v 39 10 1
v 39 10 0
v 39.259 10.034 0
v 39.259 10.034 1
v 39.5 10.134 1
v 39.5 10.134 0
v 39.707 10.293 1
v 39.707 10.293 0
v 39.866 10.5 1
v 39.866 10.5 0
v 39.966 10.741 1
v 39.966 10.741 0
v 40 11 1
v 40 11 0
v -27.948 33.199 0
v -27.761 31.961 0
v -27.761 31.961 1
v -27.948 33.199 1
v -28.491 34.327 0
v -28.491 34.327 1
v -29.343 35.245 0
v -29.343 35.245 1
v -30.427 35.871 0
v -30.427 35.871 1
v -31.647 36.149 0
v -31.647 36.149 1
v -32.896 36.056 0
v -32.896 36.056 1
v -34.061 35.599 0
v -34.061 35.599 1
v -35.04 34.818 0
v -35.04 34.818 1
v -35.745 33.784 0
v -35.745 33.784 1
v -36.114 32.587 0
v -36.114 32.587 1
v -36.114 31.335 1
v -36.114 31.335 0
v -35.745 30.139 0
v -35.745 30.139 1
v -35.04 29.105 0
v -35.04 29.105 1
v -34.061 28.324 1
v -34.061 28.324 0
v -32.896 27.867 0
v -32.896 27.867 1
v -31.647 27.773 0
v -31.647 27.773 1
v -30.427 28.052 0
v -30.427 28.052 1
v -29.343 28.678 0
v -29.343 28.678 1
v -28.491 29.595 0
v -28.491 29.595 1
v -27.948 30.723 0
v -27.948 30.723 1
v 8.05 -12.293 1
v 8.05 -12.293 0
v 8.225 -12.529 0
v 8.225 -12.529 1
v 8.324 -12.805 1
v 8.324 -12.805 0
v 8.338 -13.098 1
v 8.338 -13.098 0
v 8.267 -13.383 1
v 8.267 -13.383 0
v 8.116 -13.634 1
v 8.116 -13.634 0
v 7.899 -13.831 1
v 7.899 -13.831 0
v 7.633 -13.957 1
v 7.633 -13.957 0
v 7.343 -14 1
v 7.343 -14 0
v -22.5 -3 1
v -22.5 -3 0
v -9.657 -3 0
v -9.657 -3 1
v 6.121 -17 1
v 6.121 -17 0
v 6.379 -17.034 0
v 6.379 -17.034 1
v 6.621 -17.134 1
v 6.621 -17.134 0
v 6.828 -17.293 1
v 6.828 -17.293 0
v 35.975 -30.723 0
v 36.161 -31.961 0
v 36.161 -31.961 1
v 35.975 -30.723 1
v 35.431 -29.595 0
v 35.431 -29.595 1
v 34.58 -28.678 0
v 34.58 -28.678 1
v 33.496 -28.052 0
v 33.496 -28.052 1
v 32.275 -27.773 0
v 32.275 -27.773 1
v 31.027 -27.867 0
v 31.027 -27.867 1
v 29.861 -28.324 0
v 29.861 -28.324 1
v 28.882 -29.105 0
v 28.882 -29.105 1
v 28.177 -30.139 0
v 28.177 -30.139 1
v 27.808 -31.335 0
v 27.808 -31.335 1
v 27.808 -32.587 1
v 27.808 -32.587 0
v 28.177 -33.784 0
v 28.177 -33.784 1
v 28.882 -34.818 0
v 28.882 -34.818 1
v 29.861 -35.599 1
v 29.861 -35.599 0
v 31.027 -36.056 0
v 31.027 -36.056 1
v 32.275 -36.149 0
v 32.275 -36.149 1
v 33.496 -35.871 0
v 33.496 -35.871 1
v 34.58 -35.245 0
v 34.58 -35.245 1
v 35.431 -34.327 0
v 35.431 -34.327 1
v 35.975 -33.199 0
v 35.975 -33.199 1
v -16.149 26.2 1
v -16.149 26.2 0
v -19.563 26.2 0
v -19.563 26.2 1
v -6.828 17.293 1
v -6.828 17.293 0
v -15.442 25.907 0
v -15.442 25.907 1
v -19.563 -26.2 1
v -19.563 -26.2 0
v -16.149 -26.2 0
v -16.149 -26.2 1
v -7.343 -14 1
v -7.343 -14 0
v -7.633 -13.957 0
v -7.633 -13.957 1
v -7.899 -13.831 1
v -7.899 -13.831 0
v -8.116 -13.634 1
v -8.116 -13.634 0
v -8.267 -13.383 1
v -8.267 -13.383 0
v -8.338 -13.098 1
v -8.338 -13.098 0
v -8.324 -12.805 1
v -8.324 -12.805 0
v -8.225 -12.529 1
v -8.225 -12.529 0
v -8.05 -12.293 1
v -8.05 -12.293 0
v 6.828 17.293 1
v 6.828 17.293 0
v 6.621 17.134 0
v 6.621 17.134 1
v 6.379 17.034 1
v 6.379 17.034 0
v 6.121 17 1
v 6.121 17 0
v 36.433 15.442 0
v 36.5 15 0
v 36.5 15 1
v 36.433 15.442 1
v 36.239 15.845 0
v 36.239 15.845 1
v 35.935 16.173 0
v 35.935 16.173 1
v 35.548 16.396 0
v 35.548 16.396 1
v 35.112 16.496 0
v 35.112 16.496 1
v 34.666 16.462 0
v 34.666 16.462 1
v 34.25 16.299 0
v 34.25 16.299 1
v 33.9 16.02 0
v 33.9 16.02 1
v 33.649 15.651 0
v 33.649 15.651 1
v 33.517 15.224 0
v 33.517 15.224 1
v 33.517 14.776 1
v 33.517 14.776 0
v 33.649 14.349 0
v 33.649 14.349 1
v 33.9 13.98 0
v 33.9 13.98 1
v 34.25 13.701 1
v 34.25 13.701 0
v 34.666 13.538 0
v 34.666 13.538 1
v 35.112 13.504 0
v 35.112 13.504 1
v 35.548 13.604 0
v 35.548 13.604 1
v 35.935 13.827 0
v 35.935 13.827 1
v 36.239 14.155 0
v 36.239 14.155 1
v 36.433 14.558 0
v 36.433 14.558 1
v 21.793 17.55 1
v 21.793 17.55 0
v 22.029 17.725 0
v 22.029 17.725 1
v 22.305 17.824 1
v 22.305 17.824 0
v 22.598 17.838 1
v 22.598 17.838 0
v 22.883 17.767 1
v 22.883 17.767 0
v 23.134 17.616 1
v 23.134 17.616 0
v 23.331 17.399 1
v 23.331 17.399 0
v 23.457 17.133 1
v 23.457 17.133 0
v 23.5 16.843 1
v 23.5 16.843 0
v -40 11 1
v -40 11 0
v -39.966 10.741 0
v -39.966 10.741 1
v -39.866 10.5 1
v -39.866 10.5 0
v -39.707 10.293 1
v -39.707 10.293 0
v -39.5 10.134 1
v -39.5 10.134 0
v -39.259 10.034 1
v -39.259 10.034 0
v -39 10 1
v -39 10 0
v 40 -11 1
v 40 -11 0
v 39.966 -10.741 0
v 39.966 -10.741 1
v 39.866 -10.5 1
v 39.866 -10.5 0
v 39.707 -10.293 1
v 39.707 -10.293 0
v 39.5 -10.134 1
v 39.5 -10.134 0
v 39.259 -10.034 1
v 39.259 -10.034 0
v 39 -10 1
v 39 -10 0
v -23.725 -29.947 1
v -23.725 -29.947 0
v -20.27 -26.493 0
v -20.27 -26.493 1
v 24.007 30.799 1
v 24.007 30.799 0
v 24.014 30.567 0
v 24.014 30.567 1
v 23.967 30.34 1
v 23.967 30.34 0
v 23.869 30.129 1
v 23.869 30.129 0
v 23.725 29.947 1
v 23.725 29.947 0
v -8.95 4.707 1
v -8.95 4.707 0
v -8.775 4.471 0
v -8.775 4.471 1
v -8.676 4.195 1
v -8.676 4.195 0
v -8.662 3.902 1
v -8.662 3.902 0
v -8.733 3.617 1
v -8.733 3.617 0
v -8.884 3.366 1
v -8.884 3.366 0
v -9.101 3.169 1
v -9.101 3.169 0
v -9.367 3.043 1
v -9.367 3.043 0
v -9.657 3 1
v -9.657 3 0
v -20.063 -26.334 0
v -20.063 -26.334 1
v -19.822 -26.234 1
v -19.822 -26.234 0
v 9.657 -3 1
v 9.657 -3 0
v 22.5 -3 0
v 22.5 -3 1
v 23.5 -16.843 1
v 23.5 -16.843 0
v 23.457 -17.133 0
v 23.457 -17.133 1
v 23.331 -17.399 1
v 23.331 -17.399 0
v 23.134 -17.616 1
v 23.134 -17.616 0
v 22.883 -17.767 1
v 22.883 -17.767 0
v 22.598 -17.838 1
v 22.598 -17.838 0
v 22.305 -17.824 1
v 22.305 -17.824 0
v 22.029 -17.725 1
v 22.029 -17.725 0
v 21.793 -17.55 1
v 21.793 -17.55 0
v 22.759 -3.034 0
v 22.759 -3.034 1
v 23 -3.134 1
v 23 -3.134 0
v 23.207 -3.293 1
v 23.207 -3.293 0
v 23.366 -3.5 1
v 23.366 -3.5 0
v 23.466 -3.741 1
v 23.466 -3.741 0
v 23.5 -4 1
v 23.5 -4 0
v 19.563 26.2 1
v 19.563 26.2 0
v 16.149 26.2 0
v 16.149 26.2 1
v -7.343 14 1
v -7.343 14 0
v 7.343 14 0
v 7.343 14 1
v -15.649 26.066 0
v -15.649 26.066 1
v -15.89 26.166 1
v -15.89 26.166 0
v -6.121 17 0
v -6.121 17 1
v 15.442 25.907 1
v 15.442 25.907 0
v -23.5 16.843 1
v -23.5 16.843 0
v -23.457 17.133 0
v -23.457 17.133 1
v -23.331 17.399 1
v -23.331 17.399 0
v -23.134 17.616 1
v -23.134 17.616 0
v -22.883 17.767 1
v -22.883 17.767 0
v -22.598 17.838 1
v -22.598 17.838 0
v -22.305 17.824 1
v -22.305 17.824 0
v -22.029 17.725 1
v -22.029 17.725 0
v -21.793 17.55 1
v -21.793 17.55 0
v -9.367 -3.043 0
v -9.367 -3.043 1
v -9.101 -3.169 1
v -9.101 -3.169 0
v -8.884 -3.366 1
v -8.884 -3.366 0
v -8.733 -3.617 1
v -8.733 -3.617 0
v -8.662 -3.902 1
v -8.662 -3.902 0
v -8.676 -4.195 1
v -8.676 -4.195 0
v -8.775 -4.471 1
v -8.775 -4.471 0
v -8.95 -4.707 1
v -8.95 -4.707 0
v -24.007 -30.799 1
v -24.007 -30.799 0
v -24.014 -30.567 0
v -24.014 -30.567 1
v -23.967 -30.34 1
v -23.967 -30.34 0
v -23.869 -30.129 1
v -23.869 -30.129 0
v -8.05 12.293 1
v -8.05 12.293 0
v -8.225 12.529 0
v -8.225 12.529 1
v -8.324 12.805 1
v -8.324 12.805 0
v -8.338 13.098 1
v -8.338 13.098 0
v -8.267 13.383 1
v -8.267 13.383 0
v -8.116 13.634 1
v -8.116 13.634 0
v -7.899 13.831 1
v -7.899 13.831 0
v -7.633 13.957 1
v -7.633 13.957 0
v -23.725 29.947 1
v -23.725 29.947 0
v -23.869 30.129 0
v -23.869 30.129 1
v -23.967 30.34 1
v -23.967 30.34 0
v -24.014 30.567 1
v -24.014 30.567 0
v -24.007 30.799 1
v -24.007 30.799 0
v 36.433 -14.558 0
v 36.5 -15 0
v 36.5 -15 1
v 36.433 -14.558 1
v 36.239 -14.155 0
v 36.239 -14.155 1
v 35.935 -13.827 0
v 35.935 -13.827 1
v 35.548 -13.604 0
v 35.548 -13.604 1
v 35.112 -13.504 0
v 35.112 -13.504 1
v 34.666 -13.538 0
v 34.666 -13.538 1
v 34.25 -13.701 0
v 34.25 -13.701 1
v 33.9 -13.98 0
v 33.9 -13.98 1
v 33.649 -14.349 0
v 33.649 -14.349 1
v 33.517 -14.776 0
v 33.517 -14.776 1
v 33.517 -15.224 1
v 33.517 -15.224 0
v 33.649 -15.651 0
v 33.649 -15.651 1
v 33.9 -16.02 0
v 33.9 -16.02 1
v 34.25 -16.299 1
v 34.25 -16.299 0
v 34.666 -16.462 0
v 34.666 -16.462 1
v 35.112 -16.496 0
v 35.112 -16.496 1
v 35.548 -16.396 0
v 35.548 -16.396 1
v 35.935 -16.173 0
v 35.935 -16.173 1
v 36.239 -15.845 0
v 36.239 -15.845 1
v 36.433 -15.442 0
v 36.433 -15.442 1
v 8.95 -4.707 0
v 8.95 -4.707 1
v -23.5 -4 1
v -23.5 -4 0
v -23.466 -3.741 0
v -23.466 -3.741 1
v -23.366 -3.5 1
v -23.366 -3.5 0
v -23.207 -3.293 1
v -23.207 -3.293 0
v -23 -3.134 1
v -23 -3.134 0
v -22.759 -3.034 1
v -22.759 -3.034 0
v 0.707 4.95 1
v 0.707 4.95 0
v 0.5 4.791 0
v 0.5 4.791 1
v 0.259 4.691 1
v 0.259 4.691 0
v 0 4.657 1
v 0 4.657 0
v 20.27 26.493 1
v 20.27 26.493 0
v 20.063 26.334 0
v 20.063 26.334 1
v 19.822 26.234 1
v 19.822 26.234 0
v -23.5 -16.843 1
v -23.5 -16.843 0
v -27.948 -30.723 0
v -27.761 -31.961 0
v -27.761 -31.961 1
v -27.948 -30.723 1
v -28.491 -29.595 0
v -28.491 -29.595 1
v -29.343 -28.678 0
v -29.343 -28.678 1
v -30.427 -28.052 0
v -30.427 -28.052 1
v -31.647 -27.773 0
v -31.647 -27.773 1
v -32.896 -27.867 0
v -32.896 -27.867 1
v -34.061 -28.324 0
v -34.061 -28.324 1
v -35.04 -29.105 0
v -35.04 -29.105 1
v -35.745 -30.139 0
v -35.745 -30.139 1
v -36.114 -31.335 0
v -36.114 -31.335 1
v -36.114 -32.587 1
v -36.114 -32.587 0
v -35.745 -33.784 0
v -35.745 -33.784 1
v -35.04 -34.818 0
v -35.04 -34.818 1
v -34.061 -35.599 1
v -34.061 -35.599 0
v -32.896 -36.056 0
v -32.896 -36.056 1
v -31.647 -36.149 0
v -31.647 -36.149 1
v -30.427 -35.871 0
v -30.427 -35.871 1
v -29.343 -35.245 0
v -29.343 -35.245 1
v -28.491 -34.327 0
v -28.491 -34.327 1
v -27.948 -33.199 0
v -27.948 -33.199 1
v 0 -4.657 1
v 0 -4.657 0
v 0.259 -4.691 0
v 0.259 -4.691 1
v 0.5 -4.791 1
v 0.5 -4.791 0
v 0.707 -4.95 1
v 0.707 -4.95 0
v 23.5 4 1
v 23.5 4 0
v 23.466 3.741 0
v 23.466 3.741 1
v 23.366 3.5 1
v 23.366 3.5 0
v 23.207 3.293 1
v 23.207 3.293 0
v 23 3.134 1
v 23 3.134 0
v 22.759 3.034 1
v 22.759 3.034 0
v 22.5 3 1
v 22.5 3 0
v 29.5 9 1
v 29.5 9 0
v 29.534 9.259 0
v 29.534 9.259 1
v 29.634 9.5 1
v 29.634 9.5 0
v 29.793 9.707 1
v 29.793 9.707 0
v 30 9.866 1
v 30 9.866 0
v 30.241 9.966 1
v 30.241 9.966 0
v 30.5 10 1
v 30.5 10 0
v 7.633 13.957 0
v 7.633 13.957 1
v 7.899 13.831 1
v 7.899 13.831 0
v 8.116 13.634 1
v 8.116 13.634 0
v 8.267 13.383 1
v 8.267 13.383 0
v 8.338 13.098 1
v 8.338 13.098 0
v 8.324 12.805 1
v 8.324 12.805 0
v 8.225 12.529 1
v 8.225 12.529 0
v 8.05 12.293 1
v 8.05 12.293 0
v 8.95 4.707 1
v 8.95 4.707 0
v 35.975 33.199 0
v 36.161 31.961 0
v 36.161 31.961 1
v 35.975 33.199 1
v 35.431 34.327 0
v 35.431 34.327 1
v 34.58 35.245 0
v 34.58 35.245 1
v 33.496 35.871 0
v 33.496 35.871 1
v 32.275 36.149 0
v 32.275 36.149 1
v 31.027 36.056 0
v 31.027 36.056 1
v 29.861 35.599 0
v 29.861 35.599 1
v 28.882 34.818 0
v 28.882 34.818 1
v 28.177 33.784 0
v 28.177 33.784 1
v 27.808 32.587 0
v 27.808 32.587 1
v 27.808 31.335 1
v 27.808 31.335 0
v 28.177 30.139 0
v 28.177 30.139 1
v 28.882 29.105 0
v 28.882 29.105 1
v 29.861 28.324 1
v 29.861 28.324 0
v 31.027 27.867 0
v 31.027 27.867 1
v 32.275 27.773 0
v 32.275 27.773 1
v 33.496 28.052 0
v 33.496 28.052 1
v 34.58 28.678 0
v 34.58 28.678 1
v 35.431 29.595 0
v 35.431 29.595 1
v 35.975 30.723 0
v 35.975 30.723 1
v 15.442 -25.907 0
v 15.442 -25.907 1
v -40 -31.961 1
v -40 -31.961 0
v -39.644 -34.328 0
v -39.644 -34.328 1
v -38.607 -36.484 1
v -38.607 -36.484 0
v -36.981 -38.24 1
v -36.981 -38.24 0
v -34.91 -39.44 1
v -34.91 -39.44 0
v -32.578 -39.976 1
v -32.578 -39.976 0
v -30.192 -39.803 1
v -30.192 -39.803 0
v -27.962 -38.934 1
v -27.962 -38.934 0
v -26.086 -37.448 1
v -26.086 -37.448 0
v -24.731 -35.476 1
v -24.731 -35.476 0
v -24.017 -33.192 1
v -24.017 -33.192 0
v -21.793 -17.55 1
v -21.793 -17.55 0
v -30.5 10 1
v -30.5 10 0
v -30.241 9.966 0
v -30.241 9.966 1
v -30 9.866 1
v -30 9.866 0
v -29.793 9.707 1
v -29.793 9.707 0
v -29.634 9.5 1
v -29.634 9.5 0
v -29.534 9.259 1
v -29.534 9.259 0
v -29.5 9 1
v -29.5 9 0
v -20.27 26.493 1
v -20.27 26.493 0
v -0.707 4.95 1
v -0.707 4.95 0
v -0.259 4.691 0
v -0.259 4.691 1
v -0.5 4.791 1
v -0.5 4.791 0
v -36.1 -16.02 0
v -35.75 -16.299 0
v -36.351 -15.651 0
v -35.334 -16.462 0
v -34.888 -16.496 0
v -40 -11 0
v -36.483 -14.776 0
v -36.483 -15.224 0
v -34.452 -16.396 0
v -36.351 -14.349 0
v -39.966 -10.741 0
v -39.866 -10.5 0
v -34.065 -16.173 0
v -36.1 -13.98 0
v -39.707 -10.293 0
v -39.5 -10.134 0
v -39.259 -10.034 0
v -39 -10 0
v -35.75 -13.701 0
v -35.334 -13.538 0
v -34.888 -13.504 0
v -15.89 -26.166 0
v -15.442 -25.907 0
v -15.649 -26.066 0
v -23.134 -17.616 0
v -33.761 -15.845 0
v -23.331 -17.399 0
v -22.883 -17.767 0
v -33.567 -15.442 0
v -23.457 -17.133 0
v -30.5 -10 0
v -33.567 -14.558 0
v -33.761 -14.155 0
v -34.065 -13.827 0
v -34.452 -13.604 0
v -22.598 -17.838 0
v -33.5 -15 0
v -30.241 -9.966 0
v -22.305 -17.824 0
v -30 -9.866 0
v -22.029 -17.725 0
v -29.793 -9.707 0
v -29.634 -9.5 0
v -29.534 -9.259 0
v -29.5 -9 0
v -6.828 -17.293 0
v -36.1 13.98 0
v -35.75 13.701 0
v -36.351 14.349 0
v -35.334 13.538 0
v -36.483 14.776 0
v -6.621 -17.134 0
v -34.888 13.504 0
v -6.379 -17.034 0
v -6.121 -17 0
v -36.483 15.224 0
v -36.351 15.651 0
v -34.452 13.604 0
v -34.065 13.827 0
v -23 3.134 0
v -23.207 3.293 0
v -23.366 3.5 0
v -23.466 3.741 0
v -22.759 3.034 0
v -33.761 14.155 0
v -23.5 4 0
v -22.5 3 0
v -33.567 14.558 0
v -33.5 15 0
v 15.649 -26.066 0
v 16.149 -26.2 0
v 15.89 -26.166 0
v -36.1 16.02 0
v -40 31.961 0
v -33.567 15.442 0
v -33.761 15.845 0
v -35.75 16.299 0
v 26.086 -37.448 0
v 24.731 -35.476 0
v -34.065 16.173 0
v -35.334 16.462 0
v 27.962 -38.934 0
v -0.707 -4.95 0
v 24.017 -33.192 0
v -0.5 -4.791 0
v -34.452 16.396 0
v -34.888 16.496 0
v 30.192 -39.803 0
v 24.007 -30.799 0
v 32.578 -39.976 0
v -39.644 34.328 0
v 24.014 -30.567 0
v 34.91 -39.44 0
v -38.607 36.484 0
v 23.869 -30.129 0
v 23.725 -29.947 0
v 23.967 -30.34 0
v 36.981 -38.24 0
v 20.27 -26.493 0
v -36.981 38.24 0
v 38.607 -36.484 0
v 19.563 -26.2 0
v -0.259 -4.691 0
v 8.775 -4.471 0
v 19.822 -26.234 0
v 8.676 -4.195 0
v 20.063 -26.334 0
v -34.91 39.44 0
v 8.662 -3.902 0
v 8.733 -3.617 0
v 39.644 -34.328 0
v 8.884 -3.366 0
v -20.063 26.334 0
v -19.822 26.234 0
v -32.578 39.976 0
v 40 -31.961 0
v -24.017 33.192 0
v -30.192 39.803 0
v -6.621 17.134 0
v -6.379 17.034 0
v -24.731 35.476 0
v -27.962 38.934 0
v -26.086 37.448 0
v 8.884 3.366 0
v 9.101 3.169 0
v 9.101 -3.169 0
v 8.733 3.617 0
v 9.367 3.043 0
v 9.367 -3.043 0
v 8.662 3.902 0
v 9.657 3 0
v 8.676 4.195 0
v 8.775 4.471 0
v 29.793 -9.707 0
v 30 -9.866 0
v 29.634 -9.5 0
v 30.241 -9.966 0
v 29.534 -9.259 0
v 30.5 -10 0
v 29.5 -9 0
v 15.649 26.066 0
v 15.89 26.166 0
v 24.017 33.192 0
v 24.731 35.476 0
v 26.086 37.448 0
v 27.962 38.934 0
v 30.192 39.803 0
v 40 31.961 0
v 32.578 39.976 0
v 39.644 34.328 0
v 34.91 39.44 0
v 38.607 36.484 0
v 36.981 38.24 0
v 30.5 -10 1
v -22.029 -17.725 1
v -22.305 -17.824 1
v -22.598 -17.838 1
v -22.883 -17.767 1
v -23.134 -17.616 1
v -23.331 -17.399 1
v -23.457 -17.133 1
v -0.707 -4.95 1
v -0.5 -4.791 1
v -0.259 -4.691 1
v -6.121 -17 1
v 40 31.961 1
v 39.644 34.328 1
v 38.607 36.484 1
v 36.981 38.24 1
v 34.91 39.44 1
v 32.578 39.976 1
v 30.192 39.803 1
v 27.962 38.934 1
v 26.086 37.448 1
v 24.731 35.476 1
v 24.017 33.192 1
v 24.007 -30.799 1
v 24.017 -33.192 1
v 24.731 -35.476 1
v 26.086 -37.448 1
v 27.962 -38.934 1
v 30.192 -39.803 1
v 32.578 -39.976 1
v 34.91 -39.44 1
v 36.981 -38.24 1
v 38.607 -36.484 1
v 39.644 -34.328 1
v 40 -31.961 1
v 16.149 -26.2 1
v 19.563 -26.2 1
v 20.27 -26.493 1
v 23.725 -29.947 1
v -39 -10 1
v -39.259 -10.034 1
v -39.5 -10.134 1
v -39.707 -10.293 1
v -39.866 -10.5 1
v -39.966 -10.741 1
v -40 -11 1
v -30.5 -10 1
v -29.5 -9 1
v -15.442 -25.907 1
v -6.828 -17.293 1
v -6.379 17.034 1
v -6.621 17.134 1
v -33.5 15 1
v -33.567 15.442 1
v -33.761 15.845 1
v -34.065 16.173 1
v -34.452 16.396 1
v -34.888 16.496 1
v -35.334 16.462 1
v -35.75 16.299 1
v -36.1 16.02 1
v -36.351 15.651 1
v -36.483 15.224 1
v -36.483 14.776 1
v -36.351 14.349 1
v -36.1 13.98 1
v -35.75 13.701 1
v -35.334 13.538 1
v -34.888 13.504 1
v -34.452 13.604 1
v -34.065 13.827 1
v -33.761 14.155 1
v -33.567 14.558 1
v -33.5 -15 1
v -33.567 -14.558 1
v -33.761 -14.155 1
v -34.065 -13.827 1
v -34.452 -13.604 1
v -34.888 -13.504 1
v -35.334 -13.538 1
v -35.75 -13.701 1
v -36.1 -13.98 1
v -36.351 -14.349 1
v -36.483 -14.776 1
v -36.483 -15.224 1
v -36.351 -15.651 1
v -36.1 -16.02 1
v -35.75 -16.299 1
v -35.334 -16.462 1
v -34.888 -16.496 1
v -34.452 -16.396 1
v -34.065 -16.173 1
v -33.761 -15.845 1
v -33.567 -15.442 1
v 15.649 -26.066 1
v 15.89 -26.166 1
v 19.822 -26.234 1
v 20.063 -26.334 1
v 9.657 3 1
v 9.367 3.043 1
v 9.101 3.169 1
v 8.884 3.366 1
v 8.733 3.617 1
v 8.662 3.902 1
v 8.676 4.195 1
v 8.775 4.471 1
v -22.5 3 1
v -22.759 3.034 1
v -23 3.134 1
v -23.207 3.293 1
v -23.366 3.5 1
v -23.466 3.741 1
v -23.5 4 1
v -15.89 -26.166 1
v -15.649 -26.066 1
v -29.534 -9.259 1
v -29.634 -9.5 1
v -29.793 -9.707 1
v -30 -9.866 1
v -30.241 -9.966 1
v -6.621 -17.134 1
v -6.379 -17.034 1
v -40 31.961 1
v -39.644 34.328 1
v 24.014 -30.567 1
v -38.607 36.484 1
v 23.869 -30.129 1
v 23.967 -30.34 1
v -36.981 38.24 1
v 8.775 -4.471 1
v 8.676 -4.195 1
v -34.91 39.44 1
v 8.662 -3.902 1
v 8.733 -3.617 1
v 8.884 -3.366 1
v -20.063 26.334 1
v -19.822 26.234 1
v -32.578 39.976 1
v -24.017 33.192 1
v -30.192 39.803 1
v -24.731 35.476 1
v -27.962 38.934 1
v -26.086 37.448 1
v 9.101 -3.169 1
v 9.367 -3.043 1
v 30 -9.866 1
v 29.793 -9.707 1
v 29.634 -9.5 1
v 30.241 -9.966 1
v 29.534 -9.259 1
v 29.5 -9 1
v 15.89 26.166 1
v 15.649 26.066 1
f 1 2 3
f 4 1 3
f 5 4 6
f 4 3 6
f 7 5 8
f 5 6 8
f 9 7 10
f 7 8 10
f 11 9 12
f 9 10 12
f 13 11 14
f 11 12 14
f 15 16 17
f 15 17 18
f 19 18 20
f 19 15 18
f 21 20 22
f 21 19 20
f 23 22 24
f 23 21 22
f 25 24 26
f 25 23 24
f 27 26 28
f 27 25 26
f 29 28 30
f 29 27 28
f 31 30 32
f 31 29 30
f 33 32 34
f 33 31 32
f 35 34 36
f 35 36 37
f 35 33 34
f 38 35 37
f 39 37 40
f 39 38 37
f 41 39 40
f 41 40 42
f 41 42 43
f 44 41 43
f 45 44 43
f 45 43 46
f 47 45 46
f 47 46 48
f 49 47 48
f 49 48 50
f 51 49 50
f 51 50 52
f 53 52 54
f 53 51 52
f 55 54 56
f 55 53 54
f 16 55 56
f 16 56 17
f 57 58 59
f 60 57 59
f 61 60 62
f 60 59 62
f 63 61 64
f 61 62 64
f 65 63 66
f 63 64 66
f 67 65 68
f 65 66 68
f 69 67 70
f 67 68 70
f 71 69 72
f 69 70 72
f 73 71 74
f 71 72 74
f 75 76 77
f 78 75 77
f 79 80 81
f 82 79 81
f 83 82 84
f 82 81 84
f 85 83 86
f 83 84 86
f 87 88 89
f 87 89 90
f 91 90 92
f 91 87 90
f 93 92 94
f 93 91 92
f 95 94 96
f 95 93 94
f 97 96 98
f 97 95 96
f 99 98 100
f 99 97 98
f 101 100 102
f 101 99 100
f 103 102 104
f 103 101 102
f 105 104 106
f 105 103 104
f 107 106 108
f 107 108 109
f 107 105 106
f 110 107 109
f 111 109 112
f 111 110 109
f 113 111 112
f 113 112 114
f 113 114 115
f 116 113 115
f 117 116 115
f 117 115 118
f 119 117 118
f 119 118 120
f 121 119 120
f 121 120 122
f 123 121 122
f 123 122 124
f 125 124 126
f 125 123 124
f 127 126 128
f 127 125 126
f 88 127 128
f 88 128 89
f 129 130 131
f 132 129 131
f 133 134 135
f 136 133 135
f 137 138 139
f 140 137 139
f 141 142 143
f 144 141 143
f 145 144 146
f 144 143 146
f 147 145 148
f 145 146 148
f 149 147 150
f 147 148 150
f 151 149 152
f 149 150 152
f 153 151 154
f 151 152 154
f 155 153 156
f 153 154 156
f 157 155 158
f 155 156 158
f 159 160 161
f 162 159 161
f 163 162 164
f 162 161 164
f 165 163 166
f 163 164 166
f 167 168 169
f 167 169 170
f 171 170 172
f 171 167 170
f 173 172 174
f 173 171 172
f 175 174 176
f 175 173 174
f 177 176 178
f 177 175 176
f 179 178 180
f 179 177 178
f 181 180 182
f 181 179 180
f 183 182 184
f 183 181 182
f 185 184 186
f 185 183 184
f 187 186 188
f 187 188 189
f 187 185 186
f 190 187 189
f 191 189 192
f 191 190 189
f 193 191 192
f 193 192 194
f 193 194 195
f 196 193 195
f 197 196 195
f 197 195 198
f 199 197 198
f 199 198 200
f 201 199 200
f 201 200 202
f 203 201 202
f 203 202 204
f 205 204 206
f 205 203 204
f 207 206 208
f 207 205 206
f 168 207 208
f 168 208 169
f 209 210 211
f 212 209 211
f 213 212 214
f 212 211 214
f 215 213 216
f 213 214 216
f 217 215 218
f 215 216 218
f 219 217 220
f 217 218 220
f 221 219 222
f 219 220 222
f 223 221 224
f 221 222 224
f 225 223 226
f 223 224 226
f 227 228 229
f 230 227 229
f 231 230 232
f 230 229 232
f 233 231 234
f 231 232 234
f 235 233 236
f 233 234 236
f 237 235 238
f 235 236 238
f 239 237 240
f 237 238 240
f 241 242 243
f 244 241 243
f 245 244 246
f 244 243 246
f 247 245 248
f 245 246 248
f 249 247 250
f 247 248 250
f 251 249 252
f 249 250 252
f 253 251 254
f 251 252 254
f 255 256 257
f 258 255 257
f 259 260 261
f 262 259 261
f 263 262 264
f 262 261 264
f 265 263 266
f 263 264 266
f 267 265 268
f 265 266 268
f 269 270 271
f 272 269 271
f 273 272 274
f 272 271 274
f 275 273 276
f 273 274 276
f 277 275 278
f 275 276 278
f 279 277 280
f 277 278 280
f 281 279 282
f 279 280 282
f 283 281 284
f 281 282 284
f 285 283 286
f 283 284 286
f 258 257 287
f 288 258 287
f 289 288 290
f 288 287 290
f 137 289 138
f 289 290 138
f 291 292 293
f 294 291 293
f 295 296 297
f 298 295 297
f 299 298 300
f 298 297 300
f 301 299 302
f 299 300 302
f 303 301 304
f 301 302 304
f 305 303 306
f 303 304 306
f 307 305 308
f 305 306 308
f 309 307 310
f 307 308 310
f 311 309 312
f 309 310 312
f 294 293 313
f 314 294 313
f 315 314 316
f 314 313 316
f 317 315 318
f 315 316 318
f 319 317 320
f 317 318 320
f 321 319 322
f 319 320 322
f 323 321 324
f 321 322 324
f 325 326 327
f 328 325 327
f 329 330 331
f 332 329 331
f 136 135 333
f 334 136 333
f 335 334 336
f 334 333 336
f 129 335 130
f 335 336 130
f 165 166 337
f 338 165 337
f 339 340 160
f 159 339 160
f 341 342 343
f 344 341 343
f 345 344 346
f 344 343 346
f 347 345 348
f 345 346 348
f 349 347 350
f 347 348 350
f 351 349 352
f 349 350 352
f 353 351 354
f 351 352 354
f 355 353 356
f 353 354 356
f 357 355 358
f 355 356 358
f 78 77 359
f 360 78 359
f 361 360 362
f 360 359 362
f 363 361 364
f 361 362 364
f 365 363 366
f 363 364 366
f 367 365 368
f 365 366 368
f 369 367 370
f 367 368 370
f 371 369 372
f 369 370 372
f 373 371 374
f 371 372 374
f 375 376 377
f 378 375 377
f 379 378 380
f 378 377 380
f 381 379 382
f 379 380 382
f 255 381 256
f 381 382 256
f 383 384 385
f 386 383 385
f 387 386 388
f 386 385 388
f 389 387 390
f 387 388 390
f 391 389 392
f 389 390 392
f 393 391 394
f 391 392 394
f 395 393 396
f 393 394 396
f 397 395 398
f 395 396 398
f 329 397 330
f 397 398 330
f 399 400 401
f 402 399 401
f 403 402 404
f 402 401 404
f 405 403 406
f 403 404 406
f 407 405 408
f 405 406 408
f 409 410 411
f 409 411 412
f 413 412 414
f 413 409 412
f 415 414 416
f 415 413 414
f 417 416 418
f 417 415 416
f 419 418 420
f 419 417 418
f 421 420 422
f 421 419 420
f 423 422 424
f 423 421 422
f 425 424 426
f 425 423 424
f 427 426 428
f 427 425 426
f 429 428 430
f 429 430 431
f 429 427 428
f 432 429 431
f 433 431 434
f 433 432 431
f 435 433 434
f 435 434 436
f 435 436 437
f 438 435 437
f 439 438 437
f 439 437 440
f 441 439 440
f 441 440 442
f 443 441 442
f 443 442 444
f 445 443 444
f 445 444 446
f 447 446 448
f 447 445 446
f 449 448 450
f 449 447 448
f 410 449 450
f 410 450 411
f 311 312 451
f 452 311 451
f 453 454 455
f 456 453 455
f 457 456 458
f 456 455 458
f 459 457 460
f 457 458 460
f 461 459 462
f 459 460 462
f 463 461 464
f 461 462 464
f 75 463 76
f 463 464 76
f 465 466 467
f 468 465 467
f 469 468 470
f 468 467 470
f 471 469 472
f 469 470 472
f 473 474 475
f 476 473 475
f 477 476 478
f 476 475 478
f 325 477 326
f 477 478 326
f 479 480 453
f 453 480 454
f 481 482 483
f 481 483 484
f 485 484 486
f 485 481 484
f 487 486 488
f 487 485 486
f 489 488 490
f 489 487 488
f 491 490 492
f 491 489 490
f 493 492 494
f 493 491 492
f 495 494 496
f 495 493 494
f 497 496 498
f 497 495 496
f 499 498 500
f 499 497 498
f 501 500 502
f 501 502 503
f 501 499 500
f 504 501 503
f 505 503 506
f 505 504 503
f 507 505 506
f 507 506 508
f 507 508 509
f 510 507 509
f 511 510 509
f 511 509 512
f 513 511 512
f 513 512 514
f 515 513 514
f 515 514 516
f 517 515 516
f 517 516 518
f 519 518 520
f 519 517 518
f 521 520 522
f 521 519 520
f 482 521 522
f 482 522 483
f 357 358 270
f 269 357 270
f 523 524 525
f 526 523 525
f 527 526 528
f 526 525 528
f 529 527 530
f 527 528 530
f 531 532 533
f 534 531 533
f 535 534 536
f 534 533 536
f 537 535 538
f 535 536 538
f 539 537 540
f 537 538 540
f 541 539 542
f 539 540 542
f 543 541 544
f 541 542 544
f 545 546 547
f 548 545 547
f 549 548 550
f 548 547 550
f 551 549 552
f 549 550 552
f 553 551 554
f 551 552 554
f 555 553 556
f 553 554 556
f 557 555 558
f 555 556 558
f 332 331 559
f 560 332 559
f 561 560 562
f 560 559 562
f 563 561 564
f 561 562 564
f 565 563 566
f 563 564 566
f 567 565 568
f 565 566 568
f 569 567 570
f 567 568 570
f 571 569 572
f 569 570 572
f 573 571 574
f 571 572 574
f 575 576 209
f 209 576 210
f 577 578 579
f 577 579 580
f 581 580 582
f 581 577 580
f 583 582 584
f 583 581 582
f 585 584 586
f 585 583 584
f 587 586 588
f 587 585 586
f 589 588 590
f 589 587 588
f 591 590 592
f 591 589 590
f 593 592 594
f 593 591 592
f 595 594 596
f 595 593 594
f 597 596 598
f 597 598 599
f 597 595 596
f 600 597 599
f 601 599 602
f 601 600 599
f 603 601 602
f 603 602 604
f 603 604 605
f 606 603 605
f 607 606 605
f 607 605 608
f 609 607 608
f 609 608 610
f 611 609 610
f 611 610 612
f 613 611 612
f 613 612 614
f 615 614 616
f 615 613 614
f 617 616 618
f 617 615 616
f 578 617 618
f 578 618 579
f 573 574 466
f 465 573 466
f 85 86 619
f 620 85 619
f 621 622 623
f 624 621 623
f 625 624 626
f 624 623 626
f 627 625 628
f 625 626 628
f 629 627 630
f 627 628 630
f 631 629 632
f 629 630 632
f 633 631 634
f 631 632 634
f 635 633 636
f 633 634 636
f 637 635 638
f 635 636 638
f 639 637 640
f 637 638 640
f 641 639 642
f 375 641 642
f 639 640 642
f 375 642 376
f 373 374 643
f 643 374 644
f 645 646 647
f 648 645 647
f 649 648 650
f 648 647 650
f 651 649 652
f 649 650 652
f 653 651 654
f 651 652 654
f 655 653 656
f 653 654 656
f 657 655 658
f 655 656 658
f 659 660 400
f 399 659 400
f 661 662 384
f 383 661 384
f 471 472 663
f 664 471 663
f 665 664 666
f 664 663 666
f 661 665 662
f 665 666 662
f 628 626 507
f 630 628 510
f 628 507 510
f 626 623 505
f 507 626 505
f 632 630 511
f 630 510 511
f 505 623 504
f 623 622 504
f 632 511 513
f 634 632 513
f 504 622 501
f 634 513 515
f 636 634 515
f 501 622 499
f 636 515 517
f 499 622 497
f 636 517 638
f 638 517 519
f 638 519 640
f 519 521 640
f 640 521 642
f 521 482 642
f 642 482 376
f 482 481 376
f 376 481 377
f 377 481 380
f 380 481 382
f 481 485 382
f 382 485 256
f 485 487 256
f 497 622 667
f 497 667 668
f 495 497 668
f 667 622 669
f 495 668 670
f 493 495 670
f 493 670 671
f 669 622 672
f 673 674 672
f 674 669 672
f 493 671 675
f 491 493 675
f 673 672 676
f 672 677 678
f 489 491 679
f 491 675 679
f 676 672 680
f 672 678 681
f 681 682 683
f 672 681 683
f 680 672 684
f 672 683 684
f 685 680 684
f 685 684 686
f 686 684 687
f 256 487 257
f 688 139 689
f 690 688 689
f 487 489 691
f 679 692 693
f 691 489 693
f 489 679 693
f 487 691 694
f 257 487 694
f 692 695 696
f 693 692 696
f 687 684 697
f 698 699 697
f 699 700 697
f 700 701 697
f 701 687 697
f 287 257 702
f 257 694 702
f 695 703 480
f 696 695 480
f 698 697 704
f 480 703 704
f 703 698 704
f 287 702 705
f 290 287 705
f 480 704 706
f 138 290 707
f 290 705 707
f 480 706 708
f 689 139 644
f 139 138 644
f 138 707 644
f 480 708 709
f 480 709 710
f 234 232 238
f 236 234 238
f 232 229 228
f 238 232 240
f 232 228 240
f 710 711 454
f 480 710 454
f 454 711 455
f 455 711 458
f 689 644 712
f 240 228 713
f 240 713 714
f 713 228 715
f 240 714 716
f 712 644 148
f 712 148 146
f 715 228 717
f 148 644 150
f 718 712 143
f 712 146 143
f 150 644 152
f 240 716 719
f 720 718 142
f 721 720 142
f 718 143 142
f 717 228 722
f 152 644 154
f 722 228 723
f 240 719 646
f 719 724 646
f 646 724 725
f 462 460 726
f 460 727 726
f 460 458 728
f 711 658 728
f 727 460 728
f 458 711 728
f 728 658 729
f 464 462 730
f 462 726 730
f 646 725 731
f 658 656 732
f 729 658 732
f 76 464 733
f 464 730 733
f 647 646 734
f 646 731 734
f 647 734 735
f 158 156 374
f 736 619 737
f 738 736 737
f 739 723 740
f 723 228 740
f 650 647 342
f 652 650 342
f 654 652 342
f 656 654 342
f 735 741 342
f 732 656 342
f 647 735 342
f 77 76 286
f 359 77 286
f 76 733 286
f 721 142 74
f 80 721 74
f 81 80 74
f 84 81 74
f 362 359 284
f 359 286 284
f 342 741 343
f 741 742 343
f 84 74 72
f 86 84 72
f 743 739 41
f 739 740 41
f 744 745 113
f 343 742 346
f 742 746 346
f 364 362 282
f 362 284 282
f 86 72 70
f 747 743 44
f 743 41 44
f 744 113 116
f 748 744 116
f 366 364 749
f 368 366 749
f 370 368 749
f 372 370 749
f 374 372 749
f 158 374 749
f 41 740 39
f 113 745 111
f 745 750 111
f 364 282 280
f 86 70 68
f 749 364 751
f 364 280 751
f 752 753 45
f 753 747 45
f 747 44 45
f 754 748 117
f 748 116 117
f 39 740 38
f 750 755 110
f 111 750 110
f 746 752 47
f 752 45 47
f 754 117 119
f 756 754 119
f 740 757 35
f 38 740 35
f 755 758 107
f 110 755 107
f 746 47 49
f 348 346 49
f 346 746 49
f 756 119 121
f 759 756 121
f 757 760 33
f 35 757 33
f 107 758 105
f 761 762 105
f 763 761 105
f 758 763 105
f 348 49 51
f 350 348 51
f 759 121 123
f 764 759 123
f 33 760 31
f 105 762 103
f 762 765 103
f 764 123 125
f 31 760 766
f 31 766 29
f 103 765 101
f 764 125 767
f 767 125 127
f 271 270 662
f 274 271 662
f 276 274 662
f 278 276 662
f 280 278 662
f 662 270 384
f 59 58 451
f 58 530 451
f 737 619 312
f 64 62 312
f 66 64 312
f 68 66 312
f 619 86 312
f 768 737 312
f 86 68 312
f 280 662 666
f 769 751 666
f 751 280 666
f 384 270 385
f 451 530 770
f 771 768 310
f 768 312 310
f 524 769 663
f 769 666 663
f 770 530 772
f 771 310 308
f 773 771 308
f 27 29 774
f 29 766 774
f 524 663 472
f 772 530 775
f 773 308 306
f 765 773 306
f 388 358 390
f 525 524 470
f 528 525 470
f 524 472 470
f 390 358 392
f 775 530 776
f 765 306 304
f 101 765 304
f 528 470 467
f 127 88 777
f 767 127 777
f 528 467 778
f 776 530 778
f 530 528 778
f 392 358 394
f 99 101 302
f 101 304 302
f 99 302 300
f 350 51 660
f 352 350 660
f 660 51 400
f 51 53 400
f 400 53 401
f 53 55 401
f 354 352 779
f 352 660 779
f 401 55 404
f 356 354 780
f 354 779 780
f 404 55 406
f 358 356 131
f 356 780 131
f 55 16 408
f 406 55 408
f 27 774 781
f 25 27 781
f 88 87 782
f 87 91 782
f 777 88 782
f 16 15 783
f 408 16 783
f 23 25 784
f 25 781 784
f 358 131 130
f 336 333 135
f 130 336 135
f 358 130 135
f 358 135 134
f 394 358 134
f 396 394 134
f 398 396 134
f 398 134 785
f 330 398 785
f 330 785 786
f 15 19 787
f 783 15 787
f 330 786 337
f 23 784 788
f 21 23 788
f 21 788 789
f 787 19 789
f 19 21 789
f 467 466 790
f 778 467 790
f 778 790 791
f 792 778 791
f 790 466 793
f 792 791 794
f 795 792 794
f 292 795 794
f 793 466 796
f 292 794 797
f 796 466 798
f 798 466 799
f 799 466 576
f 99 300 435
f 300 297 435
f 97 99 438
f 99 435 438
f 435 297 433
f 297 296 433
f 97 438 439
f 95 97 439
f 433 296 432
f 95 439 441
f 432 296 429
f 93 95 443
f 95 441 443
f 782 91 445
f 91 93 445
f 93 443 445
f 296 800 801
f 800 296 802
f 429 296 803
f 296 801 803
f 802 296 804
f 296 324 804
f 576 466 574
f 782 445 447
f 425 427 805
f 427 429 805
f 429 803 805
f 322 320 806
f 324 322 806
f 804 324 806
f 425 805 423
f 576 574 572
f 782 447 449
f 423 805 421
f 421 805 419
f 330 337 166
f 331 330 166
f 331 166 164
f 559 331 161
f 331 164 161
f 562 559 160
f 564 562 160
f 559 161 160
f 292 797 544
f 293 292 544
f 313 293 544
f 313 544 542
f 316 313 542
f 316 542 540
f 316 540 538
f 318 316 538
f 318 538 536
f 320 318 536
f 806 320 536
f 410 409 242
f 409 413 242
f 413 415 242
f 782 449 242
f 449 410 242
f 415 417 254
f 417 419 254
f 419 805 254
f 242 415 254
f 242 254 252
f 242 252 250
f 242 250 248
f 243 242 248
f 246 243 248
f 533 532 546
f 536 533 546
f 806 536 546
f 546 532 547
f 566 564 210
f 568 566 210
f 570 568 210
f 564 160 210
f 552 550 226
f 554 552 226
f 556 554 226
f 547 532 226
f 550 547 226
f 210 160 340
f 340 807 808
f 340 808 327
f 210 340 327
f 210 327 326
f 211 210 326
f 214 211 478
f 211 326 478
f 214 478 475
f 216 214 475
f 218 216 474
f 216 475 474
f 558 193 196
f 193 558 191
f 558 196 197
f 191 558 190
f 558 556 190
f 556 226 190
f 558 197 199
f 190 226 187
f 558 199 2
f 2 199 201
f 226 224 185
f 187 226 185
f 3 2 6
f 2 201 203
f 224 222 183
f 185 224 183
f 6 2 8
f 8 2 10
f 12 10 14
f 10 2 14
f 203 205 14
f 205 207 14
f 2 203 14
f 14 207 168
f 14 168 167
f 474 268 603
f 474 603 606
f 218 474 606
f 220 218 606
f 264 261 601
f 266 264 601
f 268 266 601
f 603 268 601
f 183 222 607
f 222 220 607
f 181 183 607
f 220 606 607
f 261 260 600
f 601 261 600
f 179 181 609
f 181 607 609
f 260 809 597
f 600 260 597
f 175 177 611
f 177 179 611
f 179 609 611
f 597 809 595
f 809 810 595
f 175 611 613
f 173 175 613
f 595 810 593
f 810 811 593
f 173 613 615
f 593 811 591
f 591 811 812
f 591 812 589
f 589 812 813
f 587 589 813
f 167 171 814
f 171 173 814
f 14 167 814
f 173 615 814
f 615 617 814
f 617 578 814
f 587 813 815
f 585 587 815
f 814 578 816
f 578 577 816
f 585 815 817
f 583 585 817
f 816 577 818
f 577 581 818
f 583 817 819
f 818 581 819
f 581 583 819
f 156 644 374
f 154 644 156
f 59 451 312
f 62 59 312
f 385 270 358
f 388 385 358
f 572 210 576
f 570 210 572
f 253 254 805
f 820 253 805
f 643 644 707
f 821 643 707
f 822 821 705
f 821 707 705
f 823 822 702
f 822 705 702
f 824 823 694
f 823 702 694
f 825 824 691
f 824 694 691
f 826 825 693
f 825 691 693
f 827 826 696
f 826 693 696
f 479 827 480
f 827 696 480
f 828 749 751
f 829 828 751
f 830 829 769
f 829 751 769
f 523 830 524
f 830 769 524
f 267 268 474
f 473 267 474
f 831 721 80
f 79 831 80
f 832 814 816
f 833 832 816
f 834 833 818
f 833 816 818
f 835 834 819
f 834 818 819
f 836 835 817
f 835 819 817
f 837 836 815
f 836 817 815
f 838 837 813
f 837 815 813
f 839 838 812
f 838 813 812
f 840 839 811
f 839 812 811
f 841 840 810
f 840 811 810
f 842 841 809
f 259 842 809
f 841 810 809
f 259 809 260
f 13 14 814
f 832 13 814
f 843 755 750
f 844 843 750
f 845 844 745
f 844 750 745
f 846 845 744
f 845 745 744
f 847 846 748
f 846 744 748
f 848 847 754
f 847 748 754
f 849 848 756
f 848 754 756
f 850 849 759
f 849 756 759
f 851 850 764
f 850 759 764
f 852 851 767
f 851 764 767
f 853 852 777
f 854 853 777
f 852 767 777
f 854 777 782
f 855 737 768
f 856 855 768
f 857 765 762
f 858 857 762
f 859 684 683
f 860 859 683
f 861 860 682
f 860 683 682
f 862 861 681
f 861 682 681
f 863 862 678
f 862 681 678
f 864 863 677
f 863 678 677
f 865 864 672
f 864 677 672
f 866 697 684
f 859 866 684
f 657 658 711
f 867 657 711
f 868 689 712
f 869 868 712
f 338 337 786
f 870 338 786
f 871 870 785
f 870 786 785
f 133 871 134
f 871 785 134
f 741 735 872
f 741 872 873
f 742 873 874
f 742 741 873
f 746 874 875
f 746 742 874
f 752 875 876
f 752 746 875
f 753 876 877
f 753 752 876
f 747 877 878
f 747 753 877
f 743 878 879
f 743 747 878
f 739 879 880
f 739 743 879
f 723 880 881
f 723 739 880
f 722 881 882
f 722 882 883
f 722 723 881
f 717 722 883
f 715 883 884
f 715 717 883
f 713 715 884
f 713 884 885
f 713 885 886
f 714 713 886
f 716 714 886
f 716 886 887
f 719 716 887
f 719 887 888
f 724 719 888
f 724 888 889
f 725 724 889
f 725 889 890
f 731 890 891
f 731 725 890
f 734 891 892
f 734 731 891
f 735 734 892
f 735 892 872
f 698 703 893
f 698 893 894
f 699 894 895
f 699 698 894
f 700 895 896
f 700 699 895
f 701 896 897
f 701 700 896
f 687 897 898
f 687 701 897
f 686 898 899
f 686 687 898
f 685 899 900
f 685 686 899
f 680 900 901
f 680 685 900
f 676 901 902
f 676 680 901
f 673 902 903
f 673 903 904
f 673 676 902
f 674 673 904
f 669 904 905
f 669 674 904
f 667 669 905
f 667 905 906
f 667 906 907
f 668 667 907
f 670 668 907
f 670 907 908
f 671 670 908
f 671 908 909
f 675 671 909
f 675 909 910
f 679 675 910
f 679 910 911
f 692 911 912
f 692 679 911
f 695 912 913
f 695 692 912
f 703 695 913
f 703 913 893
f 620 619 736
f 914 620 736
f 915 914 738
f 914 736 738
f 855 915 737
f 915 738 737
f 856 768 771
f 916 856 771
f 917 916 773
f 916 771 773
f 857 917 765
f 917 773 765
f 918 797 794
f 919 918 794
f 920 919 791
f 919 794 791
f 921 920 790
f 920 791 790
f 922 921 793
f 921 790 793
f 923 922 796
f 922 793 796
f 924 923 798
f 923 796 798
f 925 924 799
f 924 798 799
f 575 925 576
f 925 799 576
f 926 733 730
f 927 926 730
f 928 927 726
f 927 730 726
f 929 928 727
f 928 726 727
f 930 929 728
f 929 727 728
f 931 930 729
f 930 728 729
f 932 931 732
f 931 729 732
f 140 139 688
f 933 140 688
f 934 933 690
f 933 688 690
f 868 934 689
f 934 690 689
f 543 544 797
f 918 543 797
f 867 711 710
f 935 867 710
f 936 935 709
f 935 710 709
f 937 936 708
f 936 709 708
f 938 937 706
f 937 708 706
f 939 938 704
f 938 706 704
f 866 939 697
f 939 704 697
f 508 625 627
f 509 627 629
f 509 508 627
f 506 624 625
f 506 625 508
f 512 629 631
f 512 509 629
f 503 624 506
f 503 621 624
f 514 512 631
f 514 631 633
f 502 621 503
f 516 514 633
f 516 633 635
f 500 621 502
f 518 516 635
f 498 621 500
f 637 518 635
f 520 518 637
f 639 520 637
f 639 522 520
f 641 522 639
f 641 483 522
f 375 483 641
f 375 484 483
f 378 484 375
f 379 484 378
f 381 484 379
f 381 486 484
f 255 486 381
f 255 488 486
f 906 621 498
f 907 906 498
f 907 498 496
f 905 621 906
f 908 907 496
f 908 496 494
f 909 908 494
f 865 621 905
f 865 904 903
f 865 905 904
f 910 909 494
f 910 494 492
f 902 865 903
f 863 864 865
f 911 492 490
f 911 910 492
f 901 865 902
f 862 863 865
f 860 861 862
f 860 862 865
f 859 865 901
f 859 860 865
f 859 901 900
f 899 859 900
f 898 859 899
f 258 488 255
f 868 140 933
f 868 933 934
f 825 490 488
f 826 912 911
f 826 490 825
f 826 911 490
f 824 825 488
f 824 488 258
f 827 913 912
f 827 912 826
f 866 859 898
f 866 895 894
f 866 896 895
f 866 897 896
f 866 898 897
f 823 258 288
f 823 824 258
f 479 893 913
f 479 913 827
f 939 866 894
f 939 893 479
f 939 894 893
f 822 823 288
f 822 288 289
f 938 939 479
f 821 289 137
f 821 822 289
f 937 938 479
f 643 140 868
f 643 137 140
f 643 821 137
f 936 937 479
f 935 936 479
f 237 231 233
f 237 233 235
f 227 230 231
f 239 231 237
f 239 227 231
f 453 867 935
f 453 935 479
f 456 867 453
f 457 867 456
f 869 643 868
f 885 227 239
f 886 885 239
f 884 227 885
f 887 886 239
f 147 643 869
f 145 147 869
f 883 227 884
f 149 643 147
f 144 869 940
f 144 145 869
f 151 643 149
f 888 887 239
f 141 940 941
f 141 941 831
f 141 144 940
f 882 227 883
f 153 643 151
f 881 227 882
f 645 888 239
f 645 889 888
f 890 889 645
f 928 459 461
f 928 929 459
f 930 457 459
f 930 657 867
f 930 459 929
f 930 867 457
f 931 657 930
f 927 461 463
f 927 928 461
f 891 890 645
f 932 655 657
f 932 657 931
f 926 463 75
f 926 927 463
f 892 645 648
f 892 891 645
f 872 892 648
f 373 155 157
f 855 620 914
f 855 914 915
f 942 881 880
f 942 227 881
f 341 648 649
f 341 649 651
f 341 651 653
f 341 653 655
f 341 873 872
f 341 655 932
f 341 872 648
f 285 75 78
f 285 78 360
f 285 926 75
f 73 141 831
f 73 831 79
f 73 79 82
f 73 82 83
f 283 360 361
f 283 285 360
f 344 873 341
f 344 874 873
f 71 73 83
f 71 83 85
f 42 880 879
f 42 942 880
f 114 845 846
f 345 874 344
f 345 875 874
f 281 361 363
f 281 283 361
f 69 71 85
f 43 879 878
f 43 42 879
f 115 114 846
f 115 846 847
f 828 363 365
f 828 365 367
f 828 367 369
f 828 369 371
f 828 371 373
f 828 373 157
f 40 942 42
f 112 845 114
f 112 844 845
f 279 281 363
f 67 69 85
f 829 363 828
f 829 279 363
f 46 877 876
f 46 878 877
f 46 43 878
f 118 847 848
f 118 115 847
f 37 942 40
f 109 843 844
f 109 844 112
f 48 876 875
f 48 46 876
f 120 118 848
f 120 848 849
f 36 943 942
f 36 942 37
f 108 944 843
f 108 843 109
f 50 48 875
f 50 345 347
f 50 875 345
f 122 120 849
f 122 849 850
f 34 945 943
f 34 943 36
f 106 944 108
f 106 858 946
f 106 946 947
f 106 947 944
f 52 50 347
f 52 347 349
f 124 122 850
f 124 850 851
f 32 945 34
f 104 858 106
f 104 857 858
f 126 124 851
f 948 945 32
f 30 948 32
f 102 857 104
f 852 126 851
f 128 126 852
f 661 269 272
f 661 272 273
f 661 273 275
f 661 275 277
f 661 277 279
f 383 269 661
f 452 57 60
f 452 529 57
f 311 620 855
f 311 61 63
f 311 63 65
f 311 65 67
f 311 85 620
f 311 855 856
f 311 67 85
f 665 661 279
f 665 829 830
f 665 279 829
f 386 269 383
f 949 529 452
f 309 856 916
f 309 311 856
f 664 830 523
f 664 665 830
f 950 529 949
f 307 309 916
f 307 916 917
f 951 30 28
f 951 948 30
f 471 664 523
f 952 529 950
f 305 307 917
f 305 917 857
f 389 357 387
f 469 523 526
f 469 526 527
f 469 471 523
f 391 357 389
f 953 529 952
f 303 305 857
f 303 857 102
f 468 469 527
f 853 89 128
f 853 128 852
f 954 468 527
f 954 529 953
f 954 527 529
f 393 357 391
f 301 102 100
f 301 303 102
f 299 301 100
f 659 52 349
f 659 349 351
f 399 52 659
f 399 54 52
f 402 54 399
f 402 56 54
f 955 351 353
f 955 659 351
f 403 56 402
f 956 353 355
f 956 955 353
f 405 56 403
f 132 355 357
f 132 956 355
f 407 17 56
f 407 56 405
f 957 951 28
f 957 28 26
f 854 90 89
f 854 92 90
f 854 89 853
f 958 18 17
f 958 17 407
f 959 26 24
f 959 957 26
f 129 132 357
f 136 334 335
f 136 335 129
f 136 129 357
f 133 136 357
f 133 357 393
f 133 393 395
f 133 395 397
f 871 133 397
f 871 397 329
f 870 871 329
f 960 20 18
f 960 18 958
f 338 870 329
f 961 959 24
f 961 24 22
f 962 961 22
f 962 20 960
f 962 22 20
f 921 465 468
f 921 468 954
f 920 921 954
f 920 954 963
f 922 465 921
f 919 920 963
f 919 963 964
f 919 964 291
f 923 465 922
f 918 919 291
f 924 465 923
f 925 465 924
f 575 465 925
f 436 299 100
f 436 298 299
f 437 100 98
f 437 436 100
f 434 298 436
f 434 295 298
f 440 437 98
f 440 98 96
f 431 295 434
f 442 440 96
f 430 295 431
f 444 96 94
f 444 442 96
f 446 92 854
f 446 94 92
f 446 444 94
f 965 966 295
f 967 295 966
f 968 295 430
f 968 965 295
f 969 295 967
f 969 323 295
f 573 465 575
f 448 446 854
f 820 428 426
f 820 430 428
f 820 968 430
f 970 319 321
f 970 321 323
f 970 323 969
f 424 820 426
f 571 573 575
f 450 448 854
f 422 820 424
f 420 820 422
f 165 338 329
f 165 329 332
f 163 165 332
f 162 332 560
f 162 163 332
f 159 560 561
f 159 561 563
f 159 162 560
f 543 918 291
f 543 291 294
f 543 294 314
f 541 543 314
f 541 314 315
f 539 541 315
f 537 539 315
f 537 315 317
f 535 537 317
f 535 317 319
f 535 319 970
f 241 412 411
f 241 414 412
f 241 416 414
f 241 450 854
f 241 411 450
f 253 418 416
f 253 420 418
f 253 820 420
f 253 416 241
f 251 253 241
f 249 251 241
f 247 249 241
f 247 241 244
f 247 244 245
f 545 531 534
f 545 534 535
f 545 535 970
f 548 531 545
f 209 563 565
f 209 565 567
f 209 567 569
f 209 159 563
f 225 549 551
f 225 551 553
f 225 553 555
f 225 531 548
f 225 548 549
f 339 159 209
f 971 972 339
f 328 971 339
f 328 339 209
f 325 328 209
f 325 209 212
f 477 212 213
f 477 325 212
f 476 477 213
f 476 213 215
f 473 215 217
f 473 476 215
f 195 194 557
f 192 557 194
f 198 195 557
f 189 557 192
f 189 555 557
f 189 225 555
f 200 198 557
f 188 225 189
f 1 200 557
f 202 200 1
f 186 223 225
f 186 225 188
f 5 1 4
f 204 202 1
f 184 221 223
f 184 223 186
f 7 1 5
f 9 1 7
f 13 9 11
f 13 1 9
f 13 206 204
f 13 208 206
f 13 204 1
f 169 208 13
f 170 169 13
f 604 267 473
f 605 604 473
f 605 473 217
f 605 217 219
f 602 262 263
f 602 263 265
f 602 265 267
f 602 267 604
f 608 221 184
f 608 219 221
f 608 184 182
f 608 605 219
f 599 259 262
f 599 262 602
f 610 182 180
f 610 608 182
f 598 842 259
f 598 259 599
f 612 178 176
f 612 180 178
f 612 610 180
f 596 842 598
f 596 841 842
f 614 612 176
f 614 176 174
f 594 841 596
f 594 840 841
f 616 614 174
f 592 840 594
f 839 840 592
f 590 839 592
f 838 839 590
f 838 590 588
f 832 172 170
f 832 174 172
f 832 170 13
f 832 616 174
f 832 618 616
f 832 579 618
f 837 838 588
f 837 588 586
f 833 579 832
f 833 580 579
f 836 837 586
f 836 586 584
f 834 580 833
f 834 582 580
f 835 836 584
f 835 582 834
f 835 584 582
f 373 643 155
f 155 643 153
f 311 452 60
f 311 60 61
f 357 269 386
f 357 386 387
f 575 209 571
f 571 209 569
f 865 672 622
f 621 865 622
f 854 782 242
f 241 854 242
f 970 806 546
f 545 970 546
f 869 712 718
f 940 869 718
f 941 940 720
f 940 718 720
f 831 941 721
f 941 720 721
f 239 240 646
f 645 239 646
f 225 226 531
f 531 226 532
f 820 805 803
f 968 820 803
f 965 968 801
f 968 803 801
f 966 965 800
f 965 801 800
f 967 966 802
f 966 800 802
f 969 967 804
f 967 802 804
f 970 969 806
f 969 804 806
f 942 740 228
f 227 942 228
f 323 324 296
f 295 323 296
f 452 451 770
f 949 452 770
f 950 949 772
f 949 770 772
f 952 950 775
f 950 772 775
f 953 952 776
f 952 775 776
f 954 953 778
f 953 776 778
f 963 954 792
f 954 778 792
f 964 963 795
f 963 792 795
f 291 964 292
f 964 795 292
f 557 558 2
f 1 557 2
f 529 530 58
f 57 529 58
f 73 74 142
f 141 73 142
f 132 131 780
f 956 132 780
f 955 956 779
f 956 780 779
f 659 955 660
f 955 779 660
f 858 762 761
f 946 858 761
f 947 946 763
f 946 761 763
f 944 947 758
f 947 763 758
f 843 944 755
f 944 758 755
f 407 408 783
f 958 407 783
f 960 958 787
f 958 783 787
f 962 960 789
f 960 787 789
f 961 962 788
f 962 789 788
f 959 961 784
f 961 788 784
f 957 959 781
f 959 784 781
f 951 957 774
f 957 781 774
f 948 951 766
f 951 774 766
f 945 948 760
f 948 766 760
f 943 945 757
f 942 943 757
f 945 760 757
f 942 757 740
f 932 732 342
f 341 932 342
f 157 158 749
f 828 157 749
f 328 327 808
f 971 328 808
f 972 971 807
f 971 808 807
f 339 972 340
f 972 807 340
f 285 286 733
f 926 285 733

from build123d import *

# Parameters (mm, degrees)
MODEL_R         = 4.2
MODEL_R_2       = 1.5
EXTRUDE_1_DEPTH = 1


with BuildPart() as part:
    # Model → Бобышка-Вытянуть1 (new body)
    with BuildSketch(Plane.XY):
        with BuildLine():
            ThreePointArc((-40, 11), (-39.707106781, 10.292893219), (-39, 10))
            Line((-39, 10), (-30.5, 10))
            ThreePointArc((-30.5, 10), (-29.792893219, 9.707106781), (-29.5, 9))
            Line((-29.5, 9), (-29.5, 0))
            Line((-29.5, 0), (-29.5, -9))
            ThreePointArc((-29.5, -9), (-29.792893219, -9.707106781), (-30.5, -10))
            Line((-30.5, -10), (-39, -10))
            ThreePointArc((-39, -10), (-39.707106781, -10.292893219), (-40, -11))
            Line((-40, -11), (-40, -15))
            Line((-40, -15), (-40, -19))
            Line((-40, -19), (-40, -31.96122651))
            ThreePointArc((-40, -31.96122651), (-31.378483084, -39.978850181), (-24.006941008, -30.798806025))
            ThreePointArc((-24.006941008, -30.798806025), (-23.966641223, -30.339501194), (-23.724557848, -29.947097523))
            Line((-23.724557848, -29.947097523), (-20.270353544, -26.492893219))
            ThreePointArc((-20.270353544, -26.492893219), (-19.945930196, -26.276120467), (-19.563246763, -26.2))
            Line((-19.563246763, -26.2), (-16.149033201, -26.2))
            ThreePointArc((-16.149033201, -26.2), (-15.766349768, -26.123879533), (-15.44192642, -25.907106781))
            Line((-15.44192642, -25.907106781), (-6.827712857, -17.292893219))
            ThreePointArc((-6.827712857, -17.292893219), (-6.503289508, -17.076120467), (-6.120606076, -17))
            Line((-6.120606076, -17), (0, -17))
            Line((0, -17), (6.120606076, -17))
            ThreePointArc((6.120606076, -17), (6.503289508, -17.076120467), (6.827712857, -17.292893219))
            Line((6.827712857, -17.292893219), (15.44192642, -25.907106781))
            ThreePointArc((15.44192642, -25.907106781), (15.766349768, -26.123879533), (16.149033201, -26.2))
            Line((16.149033201, -26.2), (19.563246763, -26.2))
            ThreePointArc((19.563246763, -26.2), (19.945930196, -26.276120467), (20.270353544, -26.492893219))
            Line((20.270353544, -26.492893219), (23.724557848, -29.947097523))
            ThreePointArc((23.724557848, -29.947097523), (23.966641223, -30.339501194), (24.006941008, -30.798806025))
            ThreePointArc((24.006941008, -30.798806025), (31.378483084, -39.978850181), (40, -31.96122651))
            Line((40, -31.96122651), (40, -19))
            Line((40, -19), (40, -15))
            Line((40, -15), (40, -11))
            ThreePointArc((40, -11), (39.707106781, -10.292893219), (39, -10))
            Line((39, -10), (30.5, -10))
            ThreePointArc((30.5, -10), (29.792893219, -9.707106781), (29.5, -9))
            Line((29.5, -9), (29.5, 0))
            Line((29.5, 0), (29.5, 9))
            ThreePointArc((29.5, 9), (29.792893219, 9.707106781), (30.5, 10))
            Line((30.5, 10), (39, 10))
            ThreePointArc((39, 10), (39.707106781, 10.292893219), (40, 11))
            Line((40, 11), (40, 15))
            Line((40, 15), (40, 19))
            Line((40, 19), (40, 31.96122651))
            ThreePointArc((40, 31.96122651), (31.378483084, 39.978850181), (24.006941008, 30.798806025))
            ThreePointArc((24.006941008, 30.798806025), (23.966641223, 30.339501194), (23.724557848, 29.947097523))
            Line((23.724557848, 29.947097523), (20.270353544, 26.492893219))
            ThreePointArc((20.270353544, 26.492893219), (19.945930196, 26.276120467), (19.563246763, 26.2))
            Line((19.563246763, 26.2), (16.149033201, 26.2))
            ThreePointArc((16.149033201, 26.2), (15.766349768, 26.123879533), (15.44192642, 25.907106781))
            Line((15.44192642, 25.907106781), (6.827712857, 17.292893219))
            ThreePointArc((6.827712857, 17.292893219), (6.503289508, 17.076120467), (6.120606076, 17))
            Line((6.120606076, 17), (0, 17))
            Line((0, 17), (-6.120606076, 17))
            ThreePointArc((-6.120606076, 17), (-6.503289508, 17.076120467), (-6.827712857, 17.292893219))
            Line((-6.827712857, 17.292893219), (-15.44192642, 25.907106781))
            ThreePointArc((-15.44192642, 25.907106781), (-15.766349768, 26.123879533), (-16.149033201, 26.2))
            Line((-16.149033201, 26.2), (-19.563246763, 26.2))
            ThreePointArc((-19.563246763, 26.2), (-19.945930196, 26.276120467), (-20.270353544, 26.492893219))
            Line((-20.270353544, 26.492893219), (-23.724557848, 29.947097523))
            ThreePointArc((-23.724557848, 29.947097523), (-23.966641223, 30.339501194), (-24.006941008, 30.798806025))
            ThreePointArc((-24.006941008, 30.798806025), (-31.378483084, 39.978850181), (-40, 31.96122651))
            Line((-40, 31.96122651), (-40, 19))
            Line((-40, 19), (-40, 15))
            Line((-40, 15), (-40, 11))
        make_face()
        with Locations((-31.96122651, -31.96122651)):
            Circle(MODEL_R, mode=Mode.SUBTRACT)
        with Locations((-35, -15)):
            Circle(MODEL_R_2, mode=Mode.SUBTRACT)
        with BuildLine():
            ThreePointArc((-23.5, -4), (-23.207106781, -3.292893219), (-22.5, -3))
            Line((-22.5, -3), (-9.656854249, -3))
            ThreePointArc((-9.656854249, -3), (-8.732974717, -3.617316568), (-8.949747468, -4.707106781))
            Line((-8.949747468, -4.707106781), (-21.792893219, -17.550252532))
            ThreePointArc((-21.792893219, -17.550252532), (-22.882683432, -17.767025283), (-23.5, -16.843145751))
            Line((-23.5, -16.843145751), (-23.5, -6.777502295))
            Line((-23.5, -6.777502295), (-23.5, -4))
        make_face(mode=Mode.SUBTRACT)
        with Locations((31.96122651, -31.96122651)):
            Circle(MODEL_R, mode=Mode.SUBTRACT)
        with BuildLine():
            Line((9.656854249, -3), (22.5, -3))
            ThreePointArc((22.5, -3), (23.207106781, -3.292893219), (23.5, -4))
            Line((23.5, -4), (23.5, -6.777502295))
            Line((23.5, -6.777502295), (23.5, -16.843145751))
            ThreePointArc((23.5, -16.843145751), (22.882683432, -17.767025283), (21.792893219, -17.550252532))
            Line((21.792893219, -17.550252532), (8.949747468, -4.707106781))
            ThreePointArc((8.949747468, -4.707106781), (8.732974717, -3.617316568), (9.656854249, -3))
        make_face(mode=Mode.SUBTRACT)
        with BuildLine():
            Line((7.343145751, -14), (0, -14))
            Line((0, -14), (-7.343145751, -14))
            ThreePointArc((-7.343145751, -14), (-8.267025283, -13.382683432), (-8.050252532, -12.292893219))
            Line((-8.050252532, -12.292893219), (-0.707106781, -4.949747468))
            ThreePointArc((-0.707106781, -4.949747468), (-0.382683432, -4.732974717), (0, -4.656854249))
            ThreePointArc((0, -4.656854249), (0.382683432, -4.732974717), (0.707106781, -4.949747468))
            Line((0.707106781, -4.949747468), (8.050252532, -12.292893219))
            ThreePointArc((8.050252532, -12.292893219), (8.267025283, -13.382683432), (7.343145751, -14))
        make_face(mode=Mode.SUBTRACT)
        with Locations((35, -15)):
            Circle(MODEL_R_2, mode=Mode.SUBTRACT)
        with Locations((-35, 15)):
            Circle(MODEL_R_2, mode=Mode.SUBTRACT)
        with BuildLine():
            Line((-7.343145751, 14), (0, 14))
            Line((0, 14), (7.343145751, 14))
            ThreePointArc((7.343145751, 14), (8.267025283, 13.382683432), (8.050252532, 12.292893219))
            Line((8.050252532, 12.292893219), (0.707106781, 4.949747468))
            ThreePointArc((0.707106781, 4.949747468), (0.382683432, 4.732974717), (0, 4.656854249))
            ThreePointArc((0, 4.656854249), (-0.382683432, 4.732974717), (-0.707106781, 4.949747468))
            Line((-0.707106781, 4.949747468), (-8.050252532, 12.292893219))
            ThreePointArc((-8.050252532, 12.292893219), (-8.267025283, 13.382683432), (-7.343145751, 14))
        make_face(mode=Mode.SUBTRACT)
        with BuildLine():
            Line((-9.656854249, 3), (-22.5, 3))
            ThreePointArc((-22.5, 3), (-23.207106781, 3.292893219), (-23.5, 4))
            Line((-23.5, 4), (-23.5, 6.777502295))
            Line((-23.5, 6.777502295), (-23.5, 16.843145751))
            ThreePointArc((-23.5, 16.843145751), (-22.882683432, 17.767025283), (-21.792893219, 17.550252532))
            Line((-21.792893219, 17.550252532), (-8.949747468, 4.707106781))
            ThreePointArc((-8.949747468, 4.707106781), (-8.732974717, 3.617316568), (-9.656854249, 3))
        make_face(mode=Mode.SUBTRACT)
        with Locations((-31.96122651, 31.96122651)):
            Circle(MODEL_R, mode=Mode.SUBTRACT)
        with BuildLine():
            ThreePointArc((23.5, 4), (23.207106781, 3.292893219), (22.5, 3))
            Line((22.5, 3), (9.656854249, 3))
            ThreePointArc((9.656854249, 3), (8.732974717, 3.617316568), (8.949747468, 4.707106781))
            Line((8.949747468, 4.707106781), (21.792893219, 17.550252532))
            ThreePointArc((21.792893219, 17.550252532), (22.882683432, 17.767025283), (23.5, 16.843145751))
            Line((23.5, 16.843145751), (23.5, 6.777502295))
            Line((23.5, 6.777502295), (23.5, 4))
        make_face(mode=Mode.SUBTRACT)
        with Locations((35, 15)):
            Circle(MODEL_R_2, mode=Mode.SUBTRACT)
        with Locations((31.96122651, 31.96122651)):
            Circle(MODEL_R, mode=Mode.SUBTRACT)
    extrude(amount=EXTRUDE_1_DEPTH)


solid = part.part
